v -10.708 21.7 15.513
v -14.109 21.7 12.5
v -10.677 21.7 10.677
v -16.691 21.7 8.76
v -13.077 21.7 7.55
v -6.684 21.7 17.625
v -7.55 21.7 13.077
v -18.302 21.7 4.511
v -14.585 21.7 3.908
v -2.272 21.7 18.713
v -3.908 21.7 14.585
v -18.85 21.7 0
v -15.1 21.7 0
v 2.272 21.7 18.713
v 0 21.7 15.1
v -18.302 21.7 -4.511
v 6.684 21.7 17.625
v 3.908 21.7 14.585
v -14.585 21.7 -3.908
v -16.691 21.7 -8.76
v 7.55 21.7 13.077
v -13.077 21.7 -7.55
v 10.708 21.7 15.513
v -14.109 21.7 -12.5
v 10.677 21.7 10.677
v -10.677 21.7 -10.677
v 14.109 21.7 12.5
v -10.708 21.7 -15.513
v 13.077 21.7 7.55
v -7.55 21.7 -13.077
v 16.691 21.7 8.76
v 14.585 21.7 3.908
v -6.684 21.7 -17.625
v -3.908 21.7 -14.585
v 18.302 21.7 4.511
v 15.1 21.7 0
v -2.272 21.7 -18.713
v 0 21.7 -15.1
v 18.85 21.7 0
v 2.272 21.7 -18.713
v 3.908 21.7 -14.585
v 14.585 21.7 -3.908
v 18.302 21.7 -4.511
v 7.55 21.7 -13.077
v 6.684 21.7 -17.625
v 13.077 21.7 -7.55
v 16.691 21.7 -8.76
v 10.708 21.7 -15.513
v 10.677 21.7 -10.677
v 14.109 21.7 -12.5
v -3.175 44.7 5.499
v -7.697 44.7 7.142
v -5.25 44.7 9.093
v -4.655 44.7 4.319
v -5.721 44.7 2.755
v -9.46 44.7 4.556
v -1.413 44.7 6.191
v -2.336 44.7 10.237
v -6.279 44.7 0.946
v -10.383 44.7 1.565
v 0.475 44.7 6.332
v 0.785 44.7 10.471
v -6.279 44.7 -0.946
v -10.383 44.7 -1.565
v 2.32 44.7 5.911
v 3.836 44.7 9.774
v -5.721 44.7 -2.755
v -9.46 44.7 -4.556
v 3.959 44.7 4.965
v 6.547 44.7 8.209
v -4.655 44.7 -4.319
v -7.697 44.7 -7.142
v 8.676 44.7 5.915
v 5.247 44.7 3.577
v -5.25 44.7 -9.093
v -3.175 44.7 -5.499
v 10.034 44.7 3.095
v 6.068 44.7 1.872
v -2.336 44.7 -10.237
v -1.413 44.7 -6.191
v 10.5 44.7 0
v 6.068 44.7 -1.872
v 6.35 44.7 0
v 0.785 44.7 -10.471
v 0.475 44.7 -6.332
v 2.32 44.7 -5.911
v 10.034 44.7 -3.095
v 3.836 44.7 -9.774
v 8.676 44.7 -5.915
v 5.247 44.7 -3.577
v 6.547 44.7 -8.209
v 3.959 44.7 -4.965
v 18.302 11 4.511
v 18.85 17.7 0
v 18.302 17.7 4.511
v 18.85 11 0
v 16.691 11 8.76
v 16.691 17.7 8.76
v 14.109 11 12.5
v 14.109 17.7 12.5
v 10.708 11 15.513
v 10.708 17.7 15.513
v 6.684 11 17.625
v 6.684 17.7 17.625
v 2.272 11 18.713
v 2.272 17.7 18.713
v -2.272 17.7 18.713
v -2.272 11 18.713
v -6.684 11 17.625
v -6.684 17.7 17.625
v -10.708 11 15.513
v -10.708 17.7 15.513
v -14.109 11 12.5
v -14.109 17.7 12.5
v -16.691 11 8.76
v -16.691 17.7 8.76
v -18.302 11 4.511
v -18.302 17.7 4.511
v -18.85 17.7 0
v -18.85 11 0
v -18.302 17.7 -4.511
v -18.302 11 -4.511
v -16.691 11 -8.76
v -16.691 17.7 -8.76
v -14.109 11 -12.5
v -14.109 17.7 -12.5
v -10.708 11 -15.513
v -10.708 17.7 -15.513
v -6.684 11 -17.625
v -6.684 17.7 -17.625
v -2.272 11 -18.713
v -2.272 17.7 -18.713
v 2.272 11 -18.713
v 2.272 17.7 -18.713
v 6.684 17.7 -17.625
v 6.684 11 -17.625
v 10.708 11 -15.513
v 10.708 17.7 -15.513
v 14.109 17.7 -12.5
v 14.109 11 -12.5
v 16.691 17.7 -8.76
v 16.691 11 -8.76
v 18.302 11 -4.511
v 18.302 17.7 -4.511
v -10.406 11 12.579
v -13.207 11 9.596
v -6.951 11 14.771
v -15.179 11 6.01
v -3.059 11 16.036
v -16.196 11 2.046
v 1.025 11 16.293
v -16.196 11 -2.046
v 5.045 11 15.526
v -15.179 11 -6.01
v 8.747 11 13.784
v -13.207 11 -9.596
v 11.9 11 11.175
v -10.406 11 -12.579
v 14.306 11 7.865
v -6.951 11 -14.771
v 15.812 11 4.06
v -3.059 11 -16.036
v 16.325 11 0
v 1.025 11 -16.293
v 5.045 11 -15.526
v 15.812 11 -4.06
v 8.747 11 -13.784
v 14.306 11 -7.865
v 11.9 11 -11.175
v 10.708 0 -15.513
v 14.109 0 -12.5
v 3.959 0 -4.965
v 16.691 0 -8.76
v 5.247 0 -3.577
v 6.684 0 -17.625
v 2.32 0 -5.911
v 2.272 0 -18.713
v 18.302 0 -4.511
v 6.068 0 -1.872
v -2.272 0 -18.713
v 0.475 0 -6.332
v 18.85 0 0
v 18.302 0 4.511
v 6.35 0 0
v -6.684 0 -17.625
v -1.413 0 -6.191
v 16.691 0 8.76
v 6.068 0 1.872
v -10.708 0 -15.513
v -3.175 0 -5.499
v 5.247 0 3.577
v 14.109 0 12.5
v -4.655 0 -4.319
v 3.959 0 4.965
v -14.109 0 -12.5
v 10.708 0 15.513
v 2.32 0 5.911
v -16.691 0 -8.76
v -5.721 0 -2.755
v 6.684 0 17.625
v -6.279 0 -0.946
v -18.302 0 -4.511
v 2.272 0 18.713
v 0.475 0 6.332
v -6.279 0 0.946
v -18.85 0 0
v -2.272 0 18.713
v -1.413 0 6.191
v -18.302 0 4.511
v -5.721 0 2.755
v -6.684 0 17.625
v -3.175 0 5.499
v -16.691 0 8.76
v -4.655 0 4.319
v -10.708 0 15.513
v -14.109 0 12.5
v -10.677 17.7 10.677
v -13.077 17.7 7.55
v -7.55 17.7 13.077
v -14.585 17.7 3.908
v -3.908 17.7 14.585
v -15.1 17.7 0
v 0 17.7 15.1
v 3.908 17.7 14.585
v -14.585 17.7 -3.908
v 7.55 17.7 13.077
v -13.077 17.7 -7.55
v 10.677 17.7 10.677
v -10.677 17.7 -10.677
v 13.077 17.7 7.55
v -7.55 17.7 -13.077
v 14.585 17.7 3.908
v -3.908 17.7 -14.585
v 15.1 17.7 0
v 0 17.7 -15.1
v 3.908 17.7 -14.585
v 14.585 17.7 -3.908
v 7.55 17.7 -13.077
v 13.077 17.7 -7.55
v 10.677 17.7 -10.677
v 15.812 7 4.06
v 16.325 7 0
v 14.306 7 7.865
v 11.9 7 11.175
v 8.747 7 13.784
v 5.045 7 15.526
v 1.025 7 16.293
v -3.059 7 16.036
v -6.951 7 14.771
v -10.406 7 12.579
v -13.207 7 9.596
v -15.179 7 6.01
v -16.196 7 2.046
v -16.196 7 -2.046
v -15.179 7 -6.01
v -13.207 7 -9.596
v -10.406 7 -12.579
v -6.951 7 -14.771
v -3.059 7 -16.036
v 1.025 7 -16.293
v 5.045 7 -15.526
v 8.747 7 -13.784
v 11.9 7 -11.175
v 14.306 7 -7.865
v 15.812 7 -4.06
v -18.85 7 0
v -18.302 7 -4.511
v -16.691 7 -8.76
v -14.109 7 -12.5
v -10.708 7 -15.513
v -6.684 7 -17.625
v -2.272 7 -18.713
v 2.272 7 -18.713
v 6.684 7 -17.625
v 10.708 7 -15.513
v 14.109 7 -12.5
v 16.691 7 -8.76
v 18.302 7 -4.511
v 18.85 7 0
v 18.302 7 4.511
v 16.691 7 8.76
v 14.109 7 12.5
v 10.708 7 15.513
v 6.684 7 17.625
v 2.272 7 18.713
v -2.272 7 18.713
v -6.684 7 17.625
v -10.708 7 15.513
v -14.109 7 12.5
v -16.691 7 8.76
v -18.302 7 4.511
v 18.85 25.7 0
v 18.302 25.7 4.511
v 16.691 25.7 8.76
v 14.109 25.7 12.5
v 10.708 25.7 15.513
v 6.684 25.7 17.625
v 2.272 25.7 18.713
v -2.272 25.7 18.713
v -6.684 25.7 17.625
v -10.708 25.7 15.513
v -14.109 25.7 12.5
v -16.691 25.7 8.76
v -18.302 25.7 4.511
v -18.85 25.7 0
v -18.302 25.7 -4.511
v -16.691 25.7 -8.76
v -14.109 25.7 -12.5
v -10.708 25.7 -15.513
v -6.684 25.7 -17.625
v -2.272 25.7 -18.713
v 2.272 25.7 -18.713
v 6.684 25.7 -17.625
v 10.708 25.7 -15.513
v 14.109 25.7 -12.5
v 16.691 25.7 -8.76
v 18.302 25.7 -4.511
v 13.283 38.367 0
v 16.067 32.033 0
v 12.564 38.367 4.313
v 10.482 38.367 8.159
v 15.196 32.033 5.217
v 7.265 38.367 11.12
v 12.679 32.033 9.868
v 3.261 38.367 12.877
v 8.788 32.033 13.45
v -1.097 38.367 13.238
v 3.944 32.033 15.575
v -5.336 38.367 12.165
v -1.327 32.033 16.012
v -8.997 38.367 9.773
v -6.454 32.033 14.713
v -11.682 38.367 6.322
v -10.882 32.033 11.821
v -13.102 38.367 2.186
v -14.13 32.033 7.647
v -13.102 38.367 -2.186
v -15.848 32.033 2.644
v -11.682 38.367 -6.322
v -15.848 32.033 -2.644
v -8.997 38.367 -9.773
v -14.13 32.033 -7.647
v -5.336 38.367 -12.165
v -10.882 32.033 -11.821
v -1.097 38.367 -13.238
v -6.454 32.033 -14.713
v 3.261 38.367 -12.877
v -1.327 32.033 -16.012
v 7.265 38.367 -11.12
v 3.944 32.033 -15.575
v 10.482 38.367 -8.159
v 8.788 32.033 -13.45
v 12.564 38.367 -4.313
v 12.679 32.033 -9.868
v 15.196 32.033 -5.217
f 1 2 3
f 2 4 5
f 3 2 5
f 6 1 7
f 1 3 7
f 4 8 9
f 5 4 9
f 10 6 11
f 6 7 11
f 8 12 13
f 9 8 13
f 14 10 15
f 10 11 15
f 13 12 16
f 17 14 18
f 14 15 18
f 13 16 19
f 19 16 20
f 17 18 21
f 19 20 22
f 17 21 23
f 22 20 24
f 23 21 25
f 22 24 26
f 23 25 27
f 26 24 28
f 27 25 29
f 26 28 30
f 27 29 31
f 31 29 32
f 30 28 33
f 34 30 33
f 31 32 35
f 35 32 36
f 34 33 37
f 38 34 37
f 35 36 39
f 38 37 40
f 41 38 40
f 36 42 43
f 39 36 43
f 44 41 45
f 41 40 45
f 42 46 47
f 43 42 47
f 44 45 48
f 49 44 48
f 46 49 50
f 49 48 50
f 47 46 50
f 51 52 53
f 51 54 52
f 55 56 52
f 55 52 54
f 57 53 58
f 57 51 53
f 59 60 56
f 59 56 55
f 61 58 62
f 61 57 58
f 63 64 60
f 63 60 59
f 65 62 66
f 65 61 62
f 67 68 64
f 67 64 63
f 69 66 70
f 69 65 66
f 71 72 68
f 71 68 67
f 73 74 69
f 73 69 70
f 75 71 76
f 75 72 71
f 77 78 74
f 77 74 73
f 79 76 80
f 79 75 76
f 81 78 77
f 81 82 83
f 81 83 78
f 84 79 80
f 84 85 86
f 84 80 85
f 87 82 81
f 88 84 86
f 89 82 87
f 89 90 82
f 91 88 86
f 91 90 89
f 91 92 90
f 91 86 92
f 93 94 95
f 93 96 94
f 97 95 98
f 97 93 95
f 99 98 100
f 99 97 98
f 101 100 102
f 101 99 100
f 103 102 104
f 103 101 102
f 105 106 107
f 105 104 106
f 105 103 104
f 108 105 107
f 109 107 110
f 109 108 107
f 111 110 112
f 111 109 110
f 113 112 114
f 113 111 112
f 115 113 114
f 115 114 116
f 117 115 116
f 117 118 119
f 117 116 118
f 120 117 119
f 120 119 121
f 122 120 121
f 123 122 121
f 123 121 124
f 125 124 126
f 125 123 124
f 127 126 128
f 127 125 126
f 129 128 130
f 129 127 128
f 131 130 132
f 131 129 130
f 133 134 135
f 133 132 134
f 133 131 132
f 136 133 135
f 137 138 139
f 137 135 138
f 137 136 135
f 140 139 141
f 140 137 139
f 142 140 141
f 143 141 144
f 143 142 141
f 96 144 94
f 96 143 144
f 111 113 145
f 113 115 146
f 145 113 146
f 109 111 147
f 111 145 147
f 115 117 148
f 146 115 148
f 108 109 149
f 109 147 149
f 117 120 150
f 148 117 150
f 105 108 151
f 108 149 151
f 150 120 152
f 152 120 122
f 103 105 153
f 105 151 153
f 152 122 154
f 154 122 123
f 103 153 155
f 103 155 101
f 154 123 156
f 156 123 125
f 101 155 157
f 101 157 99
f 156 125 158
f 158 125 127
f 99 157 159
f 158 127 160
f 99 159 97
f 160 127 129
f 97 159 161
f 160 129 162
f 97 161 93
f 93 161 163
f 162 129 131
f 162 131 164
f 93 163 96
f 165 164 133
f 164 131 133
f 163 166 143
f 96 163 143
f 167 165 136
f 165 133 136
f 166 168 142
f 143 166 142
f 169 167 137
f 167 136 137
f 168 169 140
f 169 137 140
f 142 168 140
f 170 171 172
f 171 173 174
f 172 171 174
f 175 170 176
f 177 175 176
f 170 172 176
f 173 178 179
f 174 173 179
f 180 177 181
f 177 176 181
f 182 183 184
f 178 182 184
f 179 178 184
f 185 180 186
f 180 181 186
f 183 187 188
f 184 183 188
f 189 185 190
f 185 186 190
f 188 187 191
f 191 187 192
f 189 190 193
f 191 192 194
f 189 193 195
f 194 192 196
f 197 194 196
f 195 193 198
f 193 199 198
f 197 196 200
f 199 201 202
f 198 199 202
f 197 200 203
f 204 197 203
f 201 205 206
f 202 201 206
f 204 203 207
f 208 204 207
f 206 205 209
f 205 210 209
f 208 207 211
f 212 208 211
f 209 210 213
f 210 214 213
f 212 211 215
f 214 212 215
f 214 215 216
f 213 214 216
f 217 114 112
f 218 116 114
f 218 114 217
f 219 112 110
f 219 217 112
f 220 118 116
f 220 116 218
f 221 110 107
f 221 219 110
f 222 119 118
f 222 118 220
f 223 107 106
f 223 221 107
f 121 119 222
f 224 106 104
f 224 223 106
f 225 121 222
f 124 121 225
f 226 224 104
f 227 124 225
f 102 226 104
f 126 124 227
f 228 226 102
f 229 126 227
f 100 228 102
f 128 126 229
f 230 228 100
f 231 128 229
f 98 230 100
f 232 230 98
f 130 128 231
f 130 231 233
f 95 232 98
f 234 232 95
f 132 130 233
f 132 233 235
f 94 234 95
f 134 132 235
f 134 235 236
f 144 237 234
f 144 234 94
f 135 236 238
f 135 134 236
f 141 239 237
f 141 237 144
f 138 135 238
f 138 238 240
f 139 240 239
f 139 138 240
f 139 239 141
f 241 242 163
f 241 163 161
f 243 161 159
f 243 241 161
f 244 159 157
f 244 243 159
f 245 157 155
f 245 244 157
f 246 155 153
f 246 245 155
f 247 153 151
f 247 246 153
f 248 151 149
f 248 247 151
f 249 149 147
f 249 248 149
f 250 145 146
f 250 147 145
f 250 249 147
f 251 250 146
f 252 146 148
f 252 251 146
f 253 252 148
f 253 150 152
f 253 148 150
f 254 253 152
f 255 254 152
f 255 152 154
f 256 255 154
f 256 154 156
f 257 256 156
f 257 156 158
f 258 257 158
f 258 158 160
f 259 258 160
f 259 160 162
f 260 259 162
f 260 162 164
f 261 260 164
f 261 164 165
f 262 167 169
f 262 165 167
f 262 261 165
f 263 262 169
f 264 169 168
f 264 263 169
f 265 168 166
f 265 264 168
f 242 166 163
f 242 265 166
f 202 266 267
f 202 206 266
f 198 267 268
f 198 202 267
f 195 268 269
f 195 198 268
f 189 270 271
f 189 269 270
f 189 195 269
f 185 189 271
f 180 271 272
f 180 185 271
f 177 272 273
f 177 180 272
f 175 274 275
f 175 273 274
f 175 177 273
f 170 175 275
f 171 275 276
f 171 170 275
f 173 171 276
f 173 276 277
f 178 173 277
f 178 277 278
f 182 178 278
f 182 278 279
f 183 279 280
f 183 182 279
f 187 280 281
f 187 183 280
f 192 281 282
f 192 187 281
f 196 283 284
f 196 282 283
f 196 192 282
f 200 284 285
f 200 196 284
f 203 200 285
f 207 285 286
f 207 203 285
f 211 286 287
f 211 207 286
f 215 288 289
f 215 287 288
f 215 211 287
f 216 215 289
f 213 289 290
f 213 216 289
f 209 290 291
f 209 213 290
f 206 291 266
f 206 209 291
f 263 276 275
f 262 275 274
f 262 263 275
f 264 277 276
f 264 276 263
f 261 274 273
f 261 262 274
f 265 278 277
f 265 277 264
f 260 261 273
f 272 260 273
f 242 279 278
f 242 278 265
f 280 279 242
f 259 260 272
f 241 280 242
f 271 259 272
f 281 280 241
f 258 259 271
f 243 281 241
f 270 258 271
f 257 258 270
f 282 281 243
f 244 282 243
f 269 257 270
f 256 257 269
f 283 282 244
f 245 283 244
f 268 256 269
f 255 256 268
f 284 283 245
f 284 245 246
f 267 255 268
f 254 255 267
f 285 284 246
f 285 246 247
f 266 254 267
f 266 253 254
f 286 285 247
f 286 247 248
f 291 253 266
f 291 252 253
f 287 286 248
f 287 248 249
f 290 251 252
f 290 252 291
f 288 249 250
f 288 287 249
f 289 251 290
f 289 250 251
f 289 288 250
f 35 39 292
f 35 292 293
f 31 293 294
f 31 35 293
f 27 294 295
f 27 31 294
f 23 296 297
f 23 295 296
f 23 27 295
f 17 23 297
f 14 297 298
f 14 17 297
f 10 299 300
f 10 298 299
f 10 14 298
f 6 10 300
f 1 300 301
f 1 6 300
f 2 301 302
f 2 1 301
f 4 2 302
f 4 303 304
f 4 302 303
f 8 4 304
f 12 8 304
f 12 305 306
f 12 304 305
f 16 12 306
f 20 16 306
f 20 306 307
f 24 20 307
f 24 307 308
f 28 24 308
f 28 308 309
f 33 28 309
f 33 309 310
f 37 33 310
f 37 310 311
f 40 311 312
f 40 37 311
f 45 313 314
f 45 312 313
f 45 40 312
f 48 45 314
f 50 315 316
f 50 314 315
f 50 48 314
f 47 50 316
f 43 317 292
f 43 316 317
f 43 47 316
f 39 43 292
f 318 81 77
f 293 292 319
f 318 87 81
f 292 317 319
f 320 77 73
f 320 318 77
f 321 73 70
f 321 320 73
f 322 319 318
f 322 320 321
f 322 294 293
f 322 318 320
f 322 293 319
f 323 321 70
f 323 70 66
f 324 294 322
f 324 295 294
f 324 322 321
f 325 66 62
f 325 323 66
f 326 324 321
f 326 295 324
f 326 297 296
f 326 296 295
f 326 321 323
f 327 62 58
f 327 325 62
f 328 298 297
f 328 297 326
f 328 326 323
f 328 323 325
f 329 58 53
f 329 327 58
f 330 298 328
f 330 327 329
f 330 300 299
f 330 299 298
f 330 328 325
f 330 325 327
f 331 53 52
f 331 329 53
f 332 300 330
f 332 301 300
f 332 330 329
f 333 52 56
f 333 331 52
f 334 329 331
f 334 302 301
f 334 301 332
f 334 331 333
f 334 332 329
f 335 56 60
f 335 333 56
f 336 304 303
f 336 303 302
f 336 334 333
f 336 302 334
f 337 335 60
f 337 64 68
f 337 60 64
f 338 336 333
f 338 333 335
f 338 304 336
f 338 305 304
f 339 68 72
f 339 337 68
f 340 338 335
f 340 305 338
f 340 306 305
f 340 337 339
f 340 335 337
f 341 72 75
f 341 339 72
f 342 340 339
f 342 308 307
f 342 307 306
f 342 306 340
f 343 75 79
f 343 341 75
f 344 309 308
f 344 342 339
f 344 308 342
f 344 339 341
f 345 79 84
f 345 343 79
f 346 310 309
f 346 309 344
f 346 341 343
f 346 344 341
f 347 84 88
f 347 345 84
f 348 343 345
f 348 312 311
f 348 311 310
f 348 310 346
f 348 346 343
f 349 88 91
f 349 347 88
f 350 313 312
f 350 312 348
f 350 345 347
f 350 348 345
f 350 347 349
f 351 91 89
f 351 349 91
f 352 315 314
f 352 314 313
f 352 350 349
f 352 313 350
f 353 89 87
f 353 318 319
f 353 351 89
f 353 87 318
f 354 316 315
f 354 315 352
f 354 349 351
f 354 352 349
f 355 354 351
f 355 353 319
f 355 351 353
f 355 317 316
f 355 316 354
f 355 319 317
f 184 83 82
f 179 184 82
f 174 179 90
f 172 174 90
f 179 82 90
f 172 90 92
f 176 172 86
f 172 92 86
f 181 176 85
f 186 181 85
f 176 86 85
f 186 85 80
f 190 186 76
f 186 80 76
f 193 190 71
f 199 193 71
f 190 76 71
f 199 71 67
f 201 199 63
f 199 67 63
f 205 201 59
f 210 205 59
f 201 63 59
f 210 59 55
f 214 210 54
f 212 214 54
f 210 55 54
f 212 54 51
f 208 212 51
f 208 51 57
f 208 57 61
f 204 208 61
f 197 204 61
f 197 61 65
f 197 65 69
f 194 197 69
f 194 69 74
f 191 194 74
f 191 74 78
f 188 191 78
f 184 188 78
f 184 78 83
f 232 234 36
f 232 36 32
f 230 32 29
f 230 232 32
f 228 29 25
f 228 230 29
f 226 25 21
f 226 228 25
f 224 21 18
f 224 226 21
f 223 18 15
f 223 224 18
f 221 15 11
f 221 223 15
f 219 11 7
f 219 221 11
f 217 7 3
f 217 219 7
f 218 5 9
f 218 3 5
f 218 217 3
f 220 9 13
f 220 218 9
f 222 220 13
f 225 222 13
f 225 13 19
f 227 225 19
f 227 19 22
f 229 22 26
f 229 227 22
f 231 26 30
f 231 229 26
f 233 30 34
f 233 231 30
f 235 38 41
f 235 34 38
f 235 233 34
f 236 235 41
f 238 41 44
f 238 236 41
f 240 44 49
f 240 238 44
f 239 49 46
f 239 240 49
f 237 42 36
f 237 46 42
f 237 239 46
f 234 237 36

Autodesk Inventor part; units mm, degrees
ref_plane "YZ Plane" through (0, 0, 0) normal (1, 0, 0) x (0, 1, 0)
ref_plane "XZ Plane" through (0, 0, 0) normal (0, 1, 0) x (-1, 0, 0)
sketch "Sketch1" plane through (0, 0, 0) normal (0, 1, 0) x (-1, 0, 0)
  circle A0 centre (0, 0) radius 18.85
  dimension "d0" = 37.7
extrude "Extrusion1" add sketch "Sketch1" along normal blind 7
sketch "Sketch2" plane through (0, 7, 0) normal (0, 1, 0) x (1, 0, 0)
  circle A0 centre (0, 0) radius 16.325
  dimension "d3" = 32.65
extrude "Extrusion2" add sketch "Sketch2" along normal blind 4
sketch "Sketch3" plane through (0, 11, 0) normal (0, 1, 0) x (1, 0, 0)
  circle A0 centre (0, 0) radius 18.85
  dimension "d6" = 37.7
extrude "Extrusion3" add sketch "Sketch3" along normal blind 6.7
sketch "Sketch4" plane through (0, 17.7, 0) normal (0, 1, 0) x (1, 0, 0)
  circle A0 centre (0, 0) radius 15.1
  dimension "d9" = 30.2
extrude "Extrusion4" add sketch "Sketch4" along normal blind 4
sketch "Sketch5" plane through (0, 21.7, 0) normal (0, 1, 0) x (1, 0, 0)
  circle A0 centre (0, 0) radius 18.85
  dimension "d12" = 37.7
extrude "Extrusion5" add sketch "Sketch5" along normal blind 4
ref_plane "Work Plane1" through (0, 44.7, 0) normal (0, 1, 0) x (1, 0, 0)
sketch "Sketch6" plane through (0, 44.7, 0) normal (0, 1, 0) x (1, 0, 0)
  circle A0 centre (0, 0) radius 10.5
  dimension "d16" = 21
loft "Loft1" add profiles "Sketch6" section 2 edges at (-18.85, 25.7, 0)
sketch "Sketch7" plane through (0, 44.7, 0) normal (0, 1, 0) x (1, 0, 0)
  circle A0 centre (0, 0) radius 6.35
  dimension "d21" = 12.7
extrude "Extrusion6" cut sketch "Sketch7" against normal through all
properties part number "Soporte Intermedio" material "Steel, Alloy"
